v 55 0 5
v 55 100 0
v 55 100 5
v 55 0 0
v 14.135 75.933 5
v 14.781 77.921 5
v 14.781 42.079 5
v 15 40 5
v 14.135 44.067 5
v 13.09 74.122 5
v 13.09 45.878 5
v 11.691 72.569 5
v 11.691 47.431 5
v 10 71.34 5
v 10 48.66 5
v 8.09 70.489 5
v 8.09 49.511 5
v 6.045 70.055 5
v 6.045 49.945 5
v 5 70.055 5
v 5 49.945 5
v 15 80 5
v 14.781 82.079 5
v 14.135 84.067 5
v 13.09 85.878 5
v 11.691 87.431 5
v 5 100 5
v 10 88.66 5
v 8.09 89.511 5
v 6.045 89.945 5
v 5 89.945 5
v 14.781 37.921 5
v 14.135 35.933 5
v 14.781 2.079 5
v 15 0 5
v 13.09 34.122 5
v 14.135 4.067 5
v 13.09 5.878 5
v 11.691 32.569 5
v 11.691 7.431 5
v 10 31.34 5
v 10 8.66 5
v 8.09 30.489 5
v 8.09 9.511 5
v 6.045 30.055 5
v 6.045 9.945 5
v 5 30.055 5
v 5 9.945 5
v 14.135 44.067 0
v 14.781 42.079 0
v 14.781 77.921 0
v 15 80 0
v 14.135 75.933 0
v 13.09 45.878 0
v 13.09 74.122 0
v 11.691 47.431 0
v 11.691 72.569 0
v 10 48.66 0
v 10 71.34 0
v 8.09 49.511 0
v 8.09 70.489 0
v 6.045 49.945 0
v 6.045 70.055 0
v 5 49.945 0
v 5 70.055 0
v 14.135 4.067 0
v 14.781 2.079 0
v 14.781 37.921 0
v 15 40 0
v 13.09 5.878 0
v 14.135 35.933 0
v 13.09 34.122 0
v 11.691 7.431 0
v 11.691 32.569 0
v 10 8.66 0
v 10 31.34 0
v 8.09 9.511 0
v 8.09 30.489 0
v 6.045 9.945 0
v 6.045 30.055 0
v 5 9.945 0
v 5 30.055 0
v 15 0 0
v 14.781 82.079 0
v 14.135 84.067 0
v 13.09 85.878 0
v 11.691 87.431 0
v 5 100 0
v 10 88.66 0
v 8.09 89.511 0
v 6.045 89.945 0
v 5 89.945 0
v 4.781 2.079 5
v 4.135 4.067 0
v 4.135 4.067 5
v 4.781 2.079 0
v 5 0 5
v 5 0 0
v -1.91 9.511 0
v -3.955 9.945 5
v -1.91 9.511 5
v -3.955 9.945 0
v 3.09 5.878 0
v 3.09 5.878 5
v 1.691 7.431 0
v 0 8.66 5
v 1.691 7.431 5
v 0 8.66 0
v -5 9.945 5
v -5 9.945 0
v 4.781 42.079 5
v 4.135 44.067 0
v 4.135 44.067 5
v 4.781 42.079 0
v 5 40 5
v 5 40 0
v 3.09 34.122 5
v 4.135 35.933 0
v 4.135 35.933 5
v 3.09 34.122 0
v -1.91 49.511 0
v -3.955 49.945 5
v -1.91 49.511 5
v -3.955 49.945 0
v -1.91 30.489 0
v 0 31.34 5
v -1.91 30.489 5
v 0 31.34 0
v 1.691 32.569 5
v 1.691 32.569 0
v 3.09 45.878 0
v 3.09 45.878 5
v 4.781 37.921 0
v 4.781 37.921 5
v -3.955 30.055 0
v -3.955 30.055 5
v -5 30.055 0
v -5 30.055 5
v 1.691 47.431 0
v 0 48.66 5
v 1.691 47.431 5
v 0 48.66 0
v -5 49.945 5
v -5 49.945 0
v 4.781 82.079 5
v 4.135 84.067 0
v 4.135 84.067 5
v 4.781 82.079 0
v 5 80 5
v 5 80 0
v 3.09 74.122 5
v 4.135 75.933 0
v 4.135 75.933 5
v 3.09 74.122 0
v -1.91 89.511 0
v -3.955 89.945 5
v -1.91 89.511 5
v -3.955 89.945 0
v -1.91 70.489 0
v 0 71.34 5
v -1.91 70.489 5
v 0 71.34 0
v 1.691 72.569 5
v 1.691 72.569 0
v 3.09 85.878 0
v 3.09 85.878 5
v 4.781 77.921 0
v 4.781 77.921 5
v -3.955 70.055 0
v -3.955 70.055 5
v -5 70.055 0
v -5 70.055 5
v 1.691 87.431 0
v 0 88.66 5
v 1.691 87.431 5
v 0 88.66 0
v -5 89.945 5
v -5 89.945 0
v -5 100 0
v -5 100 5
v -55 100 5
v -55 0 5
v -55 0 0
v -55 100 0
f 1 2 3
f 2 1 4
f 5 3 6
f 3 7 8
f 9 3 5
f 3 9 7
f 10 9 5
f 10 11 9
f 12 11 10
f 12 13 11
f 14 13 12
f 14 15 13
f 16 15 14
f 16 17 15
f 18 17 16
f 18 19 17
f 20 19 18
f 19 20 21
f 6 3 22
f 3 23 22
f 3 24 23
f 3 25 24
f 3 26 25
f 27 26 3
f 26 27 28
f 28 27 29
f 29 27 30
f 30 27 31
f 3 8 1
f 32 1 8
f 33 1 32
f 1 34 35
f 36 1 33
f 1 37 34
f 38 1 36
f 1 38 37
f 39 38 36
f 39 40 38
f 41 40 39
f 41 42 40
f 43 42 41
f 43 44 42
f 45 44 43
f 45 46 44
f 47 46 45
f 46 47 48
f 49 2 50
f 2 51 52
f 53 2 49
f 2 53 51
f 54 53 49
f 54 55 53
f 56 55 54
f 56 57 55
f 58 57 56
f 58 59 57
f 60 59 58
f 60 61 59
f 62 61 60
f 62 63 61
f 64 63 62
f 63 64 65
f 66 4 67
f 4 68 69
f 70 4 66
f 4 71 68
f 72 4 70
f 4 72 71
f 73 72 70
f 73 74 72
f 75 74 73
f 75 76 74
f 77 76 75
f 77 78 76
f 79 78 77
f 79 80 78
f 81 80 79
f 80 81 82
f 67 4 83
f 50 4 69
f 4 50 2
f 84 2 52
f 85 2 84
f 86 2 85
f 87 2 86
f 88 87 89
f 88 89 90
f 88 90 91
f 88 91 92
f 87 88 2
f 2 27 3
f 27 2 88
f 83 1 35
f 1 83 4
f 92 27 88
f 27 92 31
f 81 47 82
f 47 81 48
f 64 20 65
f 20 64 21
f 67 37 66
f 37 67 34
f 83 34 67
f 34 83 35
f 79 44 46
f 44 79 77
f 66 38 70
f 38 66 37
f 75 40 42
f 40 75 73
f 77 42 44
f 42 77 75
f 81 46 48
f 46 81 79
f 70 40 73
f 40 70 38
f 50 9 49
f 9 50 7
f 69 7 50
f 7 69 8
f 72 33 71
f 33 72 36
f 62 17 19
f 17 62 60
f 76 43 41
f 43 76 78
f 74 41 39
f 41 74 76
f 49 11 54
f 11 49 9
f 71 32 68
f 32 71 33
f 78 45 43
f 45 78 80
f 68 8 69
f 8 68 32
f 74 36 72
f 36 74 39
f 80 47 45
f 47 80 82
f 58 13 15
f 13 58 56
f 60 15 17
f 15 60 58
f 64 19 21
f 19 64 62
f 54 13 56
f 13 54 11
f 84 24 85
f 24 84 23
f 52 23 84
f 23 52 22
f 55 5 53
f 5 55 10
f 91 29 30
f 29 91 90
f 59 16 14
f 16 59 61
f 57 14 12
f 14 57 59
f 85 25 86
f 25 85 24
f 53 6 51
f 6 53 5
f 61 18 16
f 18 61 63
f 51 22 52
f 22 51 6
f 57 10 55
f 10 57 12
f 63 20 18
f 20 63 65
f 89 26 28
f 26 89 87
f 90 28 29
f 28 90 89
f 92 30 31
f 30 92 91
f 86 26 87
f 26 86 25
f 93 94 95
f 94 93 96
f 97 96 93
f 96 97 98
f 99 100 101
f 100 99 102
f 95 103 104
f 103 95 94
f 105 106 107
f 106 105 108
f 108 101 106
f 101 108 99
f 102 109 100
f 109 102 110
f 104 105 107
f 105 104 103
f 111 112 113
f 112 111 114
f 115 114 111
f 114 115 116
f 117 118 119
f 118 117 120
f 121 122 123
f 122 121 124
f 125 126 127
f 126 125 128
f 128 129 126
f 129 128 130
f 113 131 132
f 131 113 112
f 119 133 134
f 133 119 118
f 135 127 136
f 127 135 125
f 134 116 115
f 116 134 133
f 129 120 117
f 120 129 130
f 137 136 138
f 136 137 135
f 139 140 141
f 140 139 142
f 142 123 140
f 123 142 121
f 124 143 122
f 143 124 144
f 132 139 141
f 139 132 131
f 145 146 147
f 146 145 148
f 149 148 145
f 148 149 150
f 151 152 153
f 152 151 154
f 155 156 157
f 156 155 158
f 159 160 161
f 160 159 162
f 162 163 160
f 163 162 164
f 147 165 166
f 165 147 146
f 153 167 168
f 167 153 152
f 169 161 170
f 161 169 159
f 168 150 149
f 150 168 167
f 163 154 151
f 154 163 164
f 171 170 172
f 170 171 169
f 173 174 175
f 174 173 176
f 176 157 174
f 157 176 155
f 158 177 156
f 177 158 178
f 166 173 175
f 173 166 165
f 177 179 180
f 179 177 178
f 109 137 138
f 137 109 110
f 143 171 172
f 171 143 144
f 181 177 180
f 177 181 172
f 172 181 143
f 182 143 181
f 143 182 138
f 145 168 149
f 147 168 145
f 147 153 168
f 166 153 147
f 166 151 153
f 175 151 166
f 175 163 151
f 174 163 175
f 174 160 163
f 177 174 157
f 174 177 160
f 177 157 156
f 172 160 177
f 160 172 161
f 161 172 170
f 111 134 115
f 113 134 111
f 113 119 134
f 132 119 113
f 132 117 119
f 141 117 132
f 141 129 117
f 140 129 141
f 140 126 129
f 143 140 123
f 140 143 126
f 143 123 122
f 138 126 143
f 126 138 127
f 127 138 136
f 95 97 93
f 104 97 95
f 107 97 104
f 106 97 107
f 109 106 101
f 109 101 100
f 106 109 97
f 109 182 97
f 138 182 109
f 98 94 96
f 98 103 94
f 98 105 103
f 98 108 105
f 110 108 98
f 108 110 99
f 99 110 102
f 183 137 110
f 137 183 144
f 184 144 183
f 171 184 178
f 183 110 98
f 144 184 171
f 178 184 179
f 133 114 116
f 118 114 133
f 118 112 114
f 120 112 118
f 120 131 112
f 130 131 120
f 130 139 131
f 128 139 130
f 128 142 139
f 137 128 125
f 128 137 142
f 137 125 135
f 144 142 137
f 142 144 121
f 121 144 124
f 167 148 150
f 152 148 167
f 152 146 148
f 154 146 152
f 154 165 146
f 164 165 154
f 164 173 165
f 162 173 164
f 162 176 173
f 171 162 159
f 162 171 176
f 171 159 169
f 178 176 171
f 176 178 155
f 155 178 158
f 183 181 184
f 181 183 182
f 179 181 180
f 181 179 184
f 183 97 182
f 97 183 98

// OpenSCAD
// file: ../cuts2/leftright.scad
module LeftRight( apart, minX, maxX, minY, maxY, minZ, maxZ, y ) {
    yy = len(y) == 0 ? [ minY : ( maxY - minY ) / 10 : maxY ] : y;

    echo( "y=", y, "yy=", yy );

    translate( [ apart/2, 0, 0 ] )
    Right( minX=minX, maxX=maxX, minY=minY, maxY=maxY, minZ=minZ, maxZ=maxZ, y=yy ) {
        children(0);
        children(1);
    };

    translate( [ -apart/2, 0, 0 ] )
    Left( minX=minX, maxX=maxX, minY=minY, maxY=maxY, minZ=minZ, maxZ=maxZ, y=yy ) {
        children(0);
        children(1);
    };
};

module Right( minX, maxX, minY, maxY, minZ, maxZ, y ) {
    difference() {
        intersection() {
            children(0);
            translate( [ 0, minY, minZ ] ) {
                cube( [ maxX, maxY - minY, maxZ - minZ ] );
            }
        };

        for( yy=y ) {
            translate( [ 0, yy, minZ ] ) {
                linear_extrude( height = maxZ - minZ ) {
                    children(1);
                }
            }
        }
    }
}

module Left( minX, maxX, minY, maxY, minZ, maxZ, y ) {
    difference() {
        children(0);
        difference() {
            translate( [ 0, minY, minZ ] ) {
                cube( [ maxX, maxY - minY, maxZ - minZ ] );
            };

            for( yy=y ) {
                translate( [ 0, yy, minZ ] ) {
                    linear_extrude( height = maxZ - minZ ) {
                        children(1);
                    }
                }
            }
        }
    }
}
// file: ../cuts2/comb.scad
use <leftright.scad>

module Comb( apart=10, minX=-200, maxX=200, minY=-200, maxY=200, minZ=-200, maxZ=200, play=0.5, y=[] ) {
    LeftRight( apart, minX, maxX, minY, maxY, minZ, maxZ, y=y ) {
        children(0);

        circle( r=10 );
    };
}
// main file
use <../cuts2/comb.scad>

module MyPart() {
    translate( [ -50, 0, 0 ] ) {
        cube( [ 100, 100, 5 ] );
    }
}

Comb() { //  y=[ 20, 60, 90, 120 ] ) {
    MyPart();
}
